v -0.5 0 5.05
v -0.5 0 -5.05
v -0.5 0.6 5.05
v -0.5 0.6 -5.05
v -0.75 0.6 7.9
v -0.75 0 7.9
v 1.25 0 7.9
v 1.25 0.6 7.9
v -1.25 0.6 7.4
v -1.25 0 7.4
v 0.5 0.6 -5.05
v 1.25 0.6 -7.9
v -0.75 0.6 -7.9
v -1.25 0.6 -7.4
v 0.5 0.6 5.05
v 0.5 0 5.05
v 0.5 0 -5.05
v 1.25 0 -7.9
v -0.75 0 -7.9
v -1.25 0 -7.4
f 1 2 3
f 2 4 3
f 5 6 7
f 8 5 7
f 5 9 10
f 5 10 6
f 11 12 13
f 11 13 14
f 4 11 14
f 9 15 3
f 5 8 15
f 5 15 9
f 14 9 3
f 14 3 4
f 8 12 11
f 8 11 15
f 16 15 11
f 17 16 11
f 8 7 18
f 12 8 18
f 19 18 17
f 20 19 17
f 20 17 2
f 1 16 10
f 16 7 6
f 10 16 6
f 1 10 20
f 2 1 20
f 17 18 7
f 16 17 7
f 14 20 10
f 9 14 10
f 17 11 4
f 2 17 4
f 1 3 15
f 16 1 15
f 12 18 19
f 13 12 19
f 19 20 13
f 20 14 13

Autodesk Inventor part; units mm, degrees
ref_plane "YZ Plane" through (0, 0, 0) normal (1, 0, 0) x (0, 1, 0)
ref_plane "XZ Plane" through (0, 0, 0) normal (0, 1, 0) x (-1, 0, 0)
ref_plane "XY Plane" through (0, 0, 0) normal (0, 0, 1) x (1, 0, 0)
sketch "Sketch1" plane through (0, 0, 0) normal (0, 1, 0) x (-1, 0, 0)
  line L0 (-1.25, -7.9) -> (1.25, -7.9)
  line L1 (1.25, -7.9) -> (1.25, 7.9)
  line L2 (1.25, 7.9) -> (-1.25, 7.9)
  line L3 (-1.25, 7.9) -> (-1.25, -7.9)
  point P0 (0, 0)
  dimension "d0" = 15.8
  dimension "d7" = 1.25
  dimension "d8" = 1.25
extrude "Extrusion1" add sketch "Sketch1" along normal blind 0.6
sketch "Sketch2" plane through (0, 0.6, 0) normal (0, 1, 0) x (1, 0, 0)
  line L0 (0.5, 5.05) -> (-0.5, 5.05)
  line L1 (-0.5, 5.05) -> (-0.5, -5.05)
  line L2 (-0.5, -5.05) -> (0.5, -5.05)
  line L3 (0.5, -5.05) -> (0.5, 5.05)
  line L4 (0.5, 5.05) -> (-0.5, -5.05) construction
  line L5 (-0.5, 5.05) -> (0.5, -5.05) construction
  point P0 (0, 0)
  dimension "d3" = 1
  dimension "d4" = 10.1
extrude "Extrusion2" cut sketch "Sketch2" against normal through all
sketch "Sketch3" plane through (0, 0.6, 0) normal (0, 1, 0) x (1, 0, 0)
  line L0 (-1.25, 7.9) -> (-1.25, -7.9) projected
  line L1 (-1.25, -7.4) -> (-0.75, -7.9)
  line L2 (-1.25, -7.9) -> (1.25, -7.9) projected
  line L3 (1.25, 7.9) -> (-1.25, 7.9) projected
  line L4 (-1.25, 7.4) -> (-0.75, 7.9)
  point P0 (0, 0)
  dimension "d9" = 0.5
  dimension "d10" = 0.5
  dimension "d11" = 0.5
  dimension "d12" = 0.5
extrude "Extrusion3" cut sketch "Sketch3" against normal through all
properties part number "insert spacer - v3"
